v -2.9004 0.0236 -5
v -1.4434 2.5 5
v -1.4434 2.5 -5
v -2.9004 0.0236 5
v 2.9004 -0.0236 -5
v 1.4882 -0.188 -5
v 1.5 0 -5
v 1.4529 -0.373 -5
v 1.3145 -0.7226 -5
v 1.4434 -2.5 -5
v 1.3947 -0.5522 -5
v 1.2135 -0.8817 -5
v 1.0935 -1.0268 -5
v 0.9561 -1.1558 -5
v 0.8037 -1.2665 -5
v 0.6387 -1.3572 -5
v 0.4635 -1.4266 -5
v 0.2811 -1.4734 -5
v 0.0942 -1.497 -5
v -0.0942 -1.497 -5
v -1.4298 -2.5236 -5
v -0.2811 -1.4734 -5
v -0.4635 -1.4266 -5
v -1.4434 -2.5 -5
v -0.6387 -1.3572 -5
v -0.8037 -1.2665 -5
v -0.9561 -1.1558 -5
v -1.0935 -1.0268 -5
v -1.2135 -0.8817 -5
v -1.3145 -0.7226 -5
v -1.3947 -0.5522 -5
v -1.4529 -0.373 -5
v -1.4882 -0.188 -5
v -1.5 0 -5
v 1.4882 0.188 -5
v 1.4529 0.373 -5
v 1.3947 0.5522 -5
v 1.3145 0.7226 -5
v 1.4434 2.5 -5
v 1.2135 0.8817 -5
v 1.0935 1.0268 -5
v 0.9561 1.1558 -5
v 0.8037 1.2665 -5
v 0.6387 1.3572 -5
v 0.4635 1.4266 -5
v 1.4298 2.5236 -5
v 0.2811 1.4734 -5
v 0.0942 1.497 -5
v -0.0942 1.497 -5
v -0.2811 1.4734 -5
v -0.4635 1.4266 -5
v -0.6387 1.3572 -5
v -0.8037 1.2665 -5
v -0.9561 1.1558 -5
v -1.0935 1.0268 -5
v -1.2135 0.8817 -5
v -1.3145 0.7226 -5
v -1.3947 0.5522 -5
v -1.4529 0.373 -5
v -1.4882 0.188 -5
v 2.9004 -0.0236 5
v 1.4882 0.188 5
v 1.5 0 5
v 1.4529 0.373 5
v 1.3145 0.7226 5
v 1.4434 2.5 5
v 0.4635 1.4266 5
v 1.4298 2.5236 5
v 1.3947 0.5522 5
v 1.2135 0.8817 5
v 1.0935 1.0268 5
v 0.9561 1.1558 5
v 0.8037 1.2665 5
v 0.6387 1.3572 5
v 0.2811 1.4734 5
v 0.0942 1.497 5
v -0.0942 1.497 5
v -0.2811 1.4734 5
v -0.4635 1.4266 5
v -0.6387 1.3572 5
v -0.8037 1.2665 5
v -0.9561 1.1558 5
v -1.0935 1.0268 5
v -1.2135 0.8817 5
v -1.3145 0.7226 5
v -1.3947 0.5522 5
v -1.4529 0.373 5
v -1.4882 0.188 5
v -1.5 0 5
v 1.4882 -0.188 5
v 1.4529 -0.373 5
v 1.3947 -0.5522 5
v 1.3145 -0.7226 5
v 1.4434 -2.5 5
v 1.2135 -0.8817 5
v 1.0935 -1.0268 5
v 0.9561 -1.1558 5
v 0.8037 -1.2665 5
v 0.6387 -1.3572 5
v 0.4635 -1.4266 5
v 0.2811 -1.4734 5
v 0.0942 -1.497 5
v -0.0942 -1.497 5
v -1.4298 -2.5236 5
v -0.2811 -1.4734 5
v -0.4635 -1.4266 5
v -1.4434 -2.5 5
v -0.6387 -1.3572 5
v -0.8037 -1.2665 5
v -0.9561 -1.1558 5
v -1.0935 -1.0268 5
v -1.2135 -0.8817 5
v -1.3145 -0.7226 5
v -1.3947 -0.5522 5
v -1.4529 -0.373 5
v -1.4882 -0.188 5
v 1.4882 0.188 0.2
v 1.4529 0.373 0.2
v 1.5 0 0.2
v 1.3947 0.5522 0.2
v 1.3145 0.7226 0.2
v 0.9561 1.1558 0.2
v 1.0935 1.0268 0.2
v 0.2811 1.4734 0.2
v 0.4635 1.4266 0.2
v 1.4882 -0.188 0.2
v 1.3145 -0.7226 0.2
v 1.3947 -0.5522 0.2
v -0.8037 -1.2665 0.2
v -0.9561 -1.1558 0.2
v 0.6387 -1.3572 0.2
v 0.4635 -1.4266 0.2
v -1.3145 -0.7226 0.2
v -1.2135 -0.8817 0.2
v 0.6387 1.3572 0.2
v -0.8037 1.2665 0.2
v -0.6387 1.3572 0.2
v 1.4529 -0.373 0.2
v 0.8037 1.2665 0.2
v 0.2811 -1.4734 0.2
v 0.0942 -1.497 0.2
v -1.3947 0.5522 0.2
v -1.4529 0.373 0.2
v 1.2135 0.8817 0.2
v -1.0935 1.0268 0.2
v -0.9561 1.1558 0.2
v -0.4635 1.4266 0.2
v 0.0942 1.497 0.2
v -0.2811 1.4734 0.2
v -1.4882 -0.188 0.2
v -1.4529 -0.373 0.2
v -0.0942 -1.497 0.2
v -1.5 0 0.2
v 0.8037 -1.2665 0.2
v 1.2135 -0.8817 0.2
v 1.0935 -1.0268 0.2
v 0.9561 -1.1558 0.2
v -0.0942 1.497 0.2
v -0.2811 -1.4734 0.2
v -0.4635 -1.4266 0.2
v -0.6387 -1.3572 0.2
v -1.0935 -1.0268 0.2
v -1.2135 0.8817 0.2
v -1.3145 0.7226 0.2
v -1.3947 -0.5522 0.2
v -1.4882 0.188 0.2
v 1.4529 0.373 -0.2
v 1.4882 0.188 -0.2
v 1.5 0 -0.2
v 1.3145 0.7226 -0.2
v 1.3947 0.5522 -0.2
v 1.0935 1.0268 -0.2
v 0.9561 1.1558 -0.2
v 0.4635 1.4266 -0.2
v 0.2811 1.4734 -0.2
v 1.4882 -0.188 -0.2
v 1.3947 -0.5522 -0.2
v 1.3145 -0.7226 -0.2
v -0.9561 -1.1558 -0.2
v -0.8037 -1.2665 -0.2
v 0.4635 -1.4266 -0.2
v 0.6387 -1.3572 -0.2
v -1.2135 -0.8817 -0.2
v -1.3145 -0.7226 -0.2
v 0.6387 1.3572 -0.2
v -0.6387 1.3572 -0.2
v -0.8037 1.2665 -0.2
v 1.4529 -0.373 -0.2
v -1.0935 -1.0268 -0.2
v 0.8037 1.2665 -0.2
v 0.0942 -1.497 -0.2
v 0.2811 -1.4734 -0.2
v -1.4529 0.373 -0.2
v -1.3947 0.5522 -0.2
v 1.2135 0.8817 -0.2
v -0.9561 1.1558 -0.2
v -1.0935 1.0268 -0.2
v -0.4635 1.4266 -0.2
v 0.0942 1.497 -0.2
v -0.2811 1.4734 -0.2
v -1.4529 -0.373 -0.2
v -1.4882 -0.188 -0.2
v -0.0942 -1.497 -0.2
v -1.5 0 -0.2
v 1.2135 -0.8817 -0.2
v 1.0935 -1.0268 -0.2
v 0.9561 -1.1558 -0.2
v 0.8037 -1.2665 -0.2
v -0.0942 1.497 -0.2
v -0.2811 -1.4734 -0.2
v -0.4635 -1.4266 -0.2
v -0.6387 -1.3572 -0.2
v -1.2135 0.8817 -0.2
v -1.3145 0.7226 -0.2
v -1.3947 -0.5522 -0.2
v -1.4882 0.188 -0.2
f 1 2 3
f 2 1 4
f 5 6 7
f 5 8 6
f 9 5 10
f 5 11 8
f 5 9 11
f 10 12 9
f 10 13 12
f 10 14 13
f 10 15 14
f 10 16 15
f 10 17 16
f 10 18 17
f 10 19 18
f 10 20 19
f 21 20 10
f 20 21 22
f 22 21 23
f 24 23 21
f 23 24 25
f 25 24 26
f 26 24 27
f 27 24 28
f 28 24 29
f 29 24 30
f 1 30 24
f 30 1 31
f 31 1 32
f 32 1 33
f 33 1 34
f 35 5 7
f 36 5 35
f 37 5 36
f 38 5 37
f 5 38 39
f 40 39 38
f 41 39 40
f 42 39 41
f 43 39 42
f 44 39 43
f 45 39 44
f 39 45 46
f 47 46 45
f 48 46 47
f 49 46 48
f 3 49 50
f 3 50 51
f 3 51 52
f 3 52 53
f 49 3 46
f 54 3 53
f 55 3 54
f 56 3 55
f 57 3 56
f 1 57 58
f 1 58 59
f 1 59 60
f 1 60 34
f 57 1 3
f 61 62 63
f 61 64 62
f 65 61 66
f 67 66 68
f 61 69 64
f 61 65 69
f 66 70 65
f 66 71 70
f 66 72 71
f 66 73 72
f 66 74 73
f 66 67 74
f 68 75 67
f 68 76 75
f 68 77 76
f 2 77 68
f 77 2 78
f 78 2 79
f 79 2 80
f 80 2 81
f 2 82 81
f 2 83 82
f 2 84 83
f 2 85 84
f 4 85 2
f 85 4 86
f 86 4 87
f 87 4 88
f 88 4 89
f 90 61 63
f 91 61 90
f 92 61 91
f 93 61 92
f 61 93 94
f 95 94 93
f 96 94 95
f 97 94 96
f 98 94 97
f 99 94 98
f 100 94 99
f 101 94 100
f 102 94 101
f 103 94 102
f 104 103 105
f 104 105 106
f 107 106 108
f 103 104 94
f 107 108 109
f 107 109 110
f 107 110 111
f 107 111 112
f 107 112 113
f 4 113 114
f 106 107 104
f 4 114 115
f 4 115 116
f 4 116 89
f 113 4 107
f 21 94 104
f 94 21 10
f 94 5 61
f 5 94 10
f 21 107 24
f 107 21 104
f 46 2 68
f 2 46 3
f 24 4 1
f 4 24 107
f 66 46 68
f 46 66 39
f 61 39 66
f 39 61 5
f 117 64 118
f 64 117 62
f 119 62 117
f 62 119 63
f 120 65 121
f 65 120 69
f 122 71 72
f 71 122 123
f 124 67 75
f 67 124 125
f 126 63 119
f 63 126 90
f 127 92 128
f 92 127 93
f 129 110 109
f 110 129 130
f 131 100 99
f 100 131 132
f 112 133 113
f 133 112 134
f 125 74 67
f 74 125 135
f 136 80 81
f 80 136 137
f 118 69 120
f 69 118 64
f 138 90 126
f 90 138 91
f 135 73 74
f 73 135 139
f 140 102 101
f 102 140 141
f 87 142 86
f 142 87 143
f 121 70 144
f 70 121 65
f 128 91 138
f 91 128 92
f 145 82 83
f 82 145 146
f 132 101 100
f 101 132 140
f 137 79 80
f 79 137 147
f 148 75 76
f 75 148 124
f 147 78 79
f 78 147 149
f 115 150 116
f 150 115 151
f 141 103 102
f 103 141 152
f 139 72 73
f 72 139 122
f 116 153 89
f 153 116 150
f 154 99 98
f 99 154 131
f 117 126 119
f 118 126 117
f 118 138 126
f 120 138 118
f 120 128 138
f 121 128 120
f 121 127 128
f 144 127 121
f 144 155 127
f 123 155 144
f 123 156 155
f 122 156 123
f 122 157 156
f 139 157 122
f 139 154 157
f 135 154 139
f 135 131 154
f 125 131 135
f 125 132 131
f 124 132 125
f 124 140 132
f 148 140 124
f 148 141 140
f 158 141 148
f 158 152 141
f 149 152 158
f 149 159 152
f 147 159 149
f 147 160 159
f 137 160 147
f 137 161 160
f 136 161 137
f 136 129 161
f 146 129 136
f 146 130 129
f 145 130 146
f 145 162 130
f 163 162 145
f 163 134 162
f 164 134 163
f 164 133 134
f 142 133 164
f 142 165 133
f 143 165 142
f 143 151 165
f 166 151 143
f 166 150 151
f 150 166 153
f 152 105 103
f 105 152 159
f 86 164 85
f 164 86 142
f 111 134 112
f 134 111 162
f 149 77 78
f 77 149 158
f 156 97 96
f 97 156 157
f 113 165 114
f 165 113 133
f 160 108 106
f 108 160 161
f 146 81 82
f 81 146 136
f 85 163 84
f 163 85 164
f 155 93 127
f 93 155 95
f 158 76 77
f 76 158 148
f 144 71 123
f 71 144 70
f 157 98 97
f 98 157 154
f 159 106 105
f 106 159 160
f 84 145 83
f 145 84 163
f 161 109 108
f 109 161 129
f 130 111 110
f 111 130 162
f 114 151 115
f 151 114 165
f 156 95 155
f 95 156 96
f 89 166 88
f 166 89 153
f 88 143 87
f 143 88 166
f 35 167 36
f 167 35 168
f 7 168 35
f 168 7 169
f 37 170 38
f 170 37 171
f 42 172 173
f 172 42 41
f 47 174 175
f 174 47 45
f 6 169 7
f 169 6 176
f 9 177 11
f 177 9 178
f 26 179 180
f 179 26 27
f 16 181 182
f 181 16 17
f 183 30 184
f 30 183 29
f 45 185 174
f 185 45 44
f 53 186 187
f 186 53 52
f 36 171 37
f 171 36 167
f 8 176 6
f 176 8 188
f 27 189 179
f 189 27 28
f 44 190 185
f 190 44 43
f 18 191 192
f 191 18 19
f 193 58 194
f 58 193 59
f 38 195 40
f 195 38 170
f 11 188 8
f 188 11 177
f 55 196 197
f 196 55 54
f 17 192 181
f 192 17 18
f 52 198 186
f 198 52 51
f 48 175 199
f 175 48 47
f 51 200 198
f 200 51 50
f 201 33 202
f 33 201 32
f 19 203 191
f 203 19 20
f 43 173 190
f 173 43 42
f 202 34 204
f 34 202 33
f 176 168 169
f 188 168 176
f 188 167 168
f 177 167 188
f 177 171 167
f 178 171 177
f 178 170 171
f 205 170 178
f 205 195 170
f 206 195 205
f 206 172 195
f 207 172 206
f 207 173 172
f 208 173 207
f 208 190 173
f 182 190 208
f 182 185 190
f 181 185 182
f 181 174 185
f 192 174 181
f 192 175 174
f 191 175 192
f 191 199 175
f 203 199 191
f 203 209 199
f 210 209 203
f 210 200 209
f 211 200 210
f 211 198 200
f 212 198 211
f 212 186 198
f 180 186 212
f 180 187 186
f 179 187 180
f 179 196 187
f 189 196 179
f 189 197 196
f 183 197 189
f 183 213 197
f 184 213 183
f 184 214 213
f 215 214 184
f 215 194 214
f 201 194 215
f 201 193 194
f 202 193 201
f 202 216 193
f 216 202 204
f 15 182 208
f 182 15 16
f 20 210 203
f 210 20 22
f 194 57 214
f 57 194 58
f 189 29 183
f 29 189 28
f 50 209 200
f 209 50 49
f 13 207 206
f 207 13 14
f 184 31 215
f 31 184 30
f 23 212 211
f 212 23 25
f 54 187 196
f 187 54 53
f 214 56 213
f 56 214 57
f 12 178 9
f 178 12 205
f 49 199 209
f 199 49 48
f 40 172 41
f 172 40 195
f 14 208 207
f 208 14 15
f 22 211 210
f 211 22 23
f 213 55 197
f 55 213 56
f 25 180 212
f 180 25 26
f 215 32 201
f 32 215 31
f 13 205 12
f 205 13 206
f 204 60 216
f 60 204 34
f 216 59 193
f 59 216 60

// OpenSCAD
$fn=50;

height = 10;

m=3;
w=5;
space=0.4;

difference() {
    depth = height/2-space/2;
    hex(w,height);
    translate([0,0,space/2]) cylinder(depth,m/2,m/2);
    translate([0,0,-depth-space/2]) cylinder(depth,m/2,m/2);
};


module hex(w,h) {
    hull() {
        cube([w/sqrt(3),w,h],center=true);
        rotate([0,0,120]) cube([w/1.7,w,h],center=true);
    }
};
